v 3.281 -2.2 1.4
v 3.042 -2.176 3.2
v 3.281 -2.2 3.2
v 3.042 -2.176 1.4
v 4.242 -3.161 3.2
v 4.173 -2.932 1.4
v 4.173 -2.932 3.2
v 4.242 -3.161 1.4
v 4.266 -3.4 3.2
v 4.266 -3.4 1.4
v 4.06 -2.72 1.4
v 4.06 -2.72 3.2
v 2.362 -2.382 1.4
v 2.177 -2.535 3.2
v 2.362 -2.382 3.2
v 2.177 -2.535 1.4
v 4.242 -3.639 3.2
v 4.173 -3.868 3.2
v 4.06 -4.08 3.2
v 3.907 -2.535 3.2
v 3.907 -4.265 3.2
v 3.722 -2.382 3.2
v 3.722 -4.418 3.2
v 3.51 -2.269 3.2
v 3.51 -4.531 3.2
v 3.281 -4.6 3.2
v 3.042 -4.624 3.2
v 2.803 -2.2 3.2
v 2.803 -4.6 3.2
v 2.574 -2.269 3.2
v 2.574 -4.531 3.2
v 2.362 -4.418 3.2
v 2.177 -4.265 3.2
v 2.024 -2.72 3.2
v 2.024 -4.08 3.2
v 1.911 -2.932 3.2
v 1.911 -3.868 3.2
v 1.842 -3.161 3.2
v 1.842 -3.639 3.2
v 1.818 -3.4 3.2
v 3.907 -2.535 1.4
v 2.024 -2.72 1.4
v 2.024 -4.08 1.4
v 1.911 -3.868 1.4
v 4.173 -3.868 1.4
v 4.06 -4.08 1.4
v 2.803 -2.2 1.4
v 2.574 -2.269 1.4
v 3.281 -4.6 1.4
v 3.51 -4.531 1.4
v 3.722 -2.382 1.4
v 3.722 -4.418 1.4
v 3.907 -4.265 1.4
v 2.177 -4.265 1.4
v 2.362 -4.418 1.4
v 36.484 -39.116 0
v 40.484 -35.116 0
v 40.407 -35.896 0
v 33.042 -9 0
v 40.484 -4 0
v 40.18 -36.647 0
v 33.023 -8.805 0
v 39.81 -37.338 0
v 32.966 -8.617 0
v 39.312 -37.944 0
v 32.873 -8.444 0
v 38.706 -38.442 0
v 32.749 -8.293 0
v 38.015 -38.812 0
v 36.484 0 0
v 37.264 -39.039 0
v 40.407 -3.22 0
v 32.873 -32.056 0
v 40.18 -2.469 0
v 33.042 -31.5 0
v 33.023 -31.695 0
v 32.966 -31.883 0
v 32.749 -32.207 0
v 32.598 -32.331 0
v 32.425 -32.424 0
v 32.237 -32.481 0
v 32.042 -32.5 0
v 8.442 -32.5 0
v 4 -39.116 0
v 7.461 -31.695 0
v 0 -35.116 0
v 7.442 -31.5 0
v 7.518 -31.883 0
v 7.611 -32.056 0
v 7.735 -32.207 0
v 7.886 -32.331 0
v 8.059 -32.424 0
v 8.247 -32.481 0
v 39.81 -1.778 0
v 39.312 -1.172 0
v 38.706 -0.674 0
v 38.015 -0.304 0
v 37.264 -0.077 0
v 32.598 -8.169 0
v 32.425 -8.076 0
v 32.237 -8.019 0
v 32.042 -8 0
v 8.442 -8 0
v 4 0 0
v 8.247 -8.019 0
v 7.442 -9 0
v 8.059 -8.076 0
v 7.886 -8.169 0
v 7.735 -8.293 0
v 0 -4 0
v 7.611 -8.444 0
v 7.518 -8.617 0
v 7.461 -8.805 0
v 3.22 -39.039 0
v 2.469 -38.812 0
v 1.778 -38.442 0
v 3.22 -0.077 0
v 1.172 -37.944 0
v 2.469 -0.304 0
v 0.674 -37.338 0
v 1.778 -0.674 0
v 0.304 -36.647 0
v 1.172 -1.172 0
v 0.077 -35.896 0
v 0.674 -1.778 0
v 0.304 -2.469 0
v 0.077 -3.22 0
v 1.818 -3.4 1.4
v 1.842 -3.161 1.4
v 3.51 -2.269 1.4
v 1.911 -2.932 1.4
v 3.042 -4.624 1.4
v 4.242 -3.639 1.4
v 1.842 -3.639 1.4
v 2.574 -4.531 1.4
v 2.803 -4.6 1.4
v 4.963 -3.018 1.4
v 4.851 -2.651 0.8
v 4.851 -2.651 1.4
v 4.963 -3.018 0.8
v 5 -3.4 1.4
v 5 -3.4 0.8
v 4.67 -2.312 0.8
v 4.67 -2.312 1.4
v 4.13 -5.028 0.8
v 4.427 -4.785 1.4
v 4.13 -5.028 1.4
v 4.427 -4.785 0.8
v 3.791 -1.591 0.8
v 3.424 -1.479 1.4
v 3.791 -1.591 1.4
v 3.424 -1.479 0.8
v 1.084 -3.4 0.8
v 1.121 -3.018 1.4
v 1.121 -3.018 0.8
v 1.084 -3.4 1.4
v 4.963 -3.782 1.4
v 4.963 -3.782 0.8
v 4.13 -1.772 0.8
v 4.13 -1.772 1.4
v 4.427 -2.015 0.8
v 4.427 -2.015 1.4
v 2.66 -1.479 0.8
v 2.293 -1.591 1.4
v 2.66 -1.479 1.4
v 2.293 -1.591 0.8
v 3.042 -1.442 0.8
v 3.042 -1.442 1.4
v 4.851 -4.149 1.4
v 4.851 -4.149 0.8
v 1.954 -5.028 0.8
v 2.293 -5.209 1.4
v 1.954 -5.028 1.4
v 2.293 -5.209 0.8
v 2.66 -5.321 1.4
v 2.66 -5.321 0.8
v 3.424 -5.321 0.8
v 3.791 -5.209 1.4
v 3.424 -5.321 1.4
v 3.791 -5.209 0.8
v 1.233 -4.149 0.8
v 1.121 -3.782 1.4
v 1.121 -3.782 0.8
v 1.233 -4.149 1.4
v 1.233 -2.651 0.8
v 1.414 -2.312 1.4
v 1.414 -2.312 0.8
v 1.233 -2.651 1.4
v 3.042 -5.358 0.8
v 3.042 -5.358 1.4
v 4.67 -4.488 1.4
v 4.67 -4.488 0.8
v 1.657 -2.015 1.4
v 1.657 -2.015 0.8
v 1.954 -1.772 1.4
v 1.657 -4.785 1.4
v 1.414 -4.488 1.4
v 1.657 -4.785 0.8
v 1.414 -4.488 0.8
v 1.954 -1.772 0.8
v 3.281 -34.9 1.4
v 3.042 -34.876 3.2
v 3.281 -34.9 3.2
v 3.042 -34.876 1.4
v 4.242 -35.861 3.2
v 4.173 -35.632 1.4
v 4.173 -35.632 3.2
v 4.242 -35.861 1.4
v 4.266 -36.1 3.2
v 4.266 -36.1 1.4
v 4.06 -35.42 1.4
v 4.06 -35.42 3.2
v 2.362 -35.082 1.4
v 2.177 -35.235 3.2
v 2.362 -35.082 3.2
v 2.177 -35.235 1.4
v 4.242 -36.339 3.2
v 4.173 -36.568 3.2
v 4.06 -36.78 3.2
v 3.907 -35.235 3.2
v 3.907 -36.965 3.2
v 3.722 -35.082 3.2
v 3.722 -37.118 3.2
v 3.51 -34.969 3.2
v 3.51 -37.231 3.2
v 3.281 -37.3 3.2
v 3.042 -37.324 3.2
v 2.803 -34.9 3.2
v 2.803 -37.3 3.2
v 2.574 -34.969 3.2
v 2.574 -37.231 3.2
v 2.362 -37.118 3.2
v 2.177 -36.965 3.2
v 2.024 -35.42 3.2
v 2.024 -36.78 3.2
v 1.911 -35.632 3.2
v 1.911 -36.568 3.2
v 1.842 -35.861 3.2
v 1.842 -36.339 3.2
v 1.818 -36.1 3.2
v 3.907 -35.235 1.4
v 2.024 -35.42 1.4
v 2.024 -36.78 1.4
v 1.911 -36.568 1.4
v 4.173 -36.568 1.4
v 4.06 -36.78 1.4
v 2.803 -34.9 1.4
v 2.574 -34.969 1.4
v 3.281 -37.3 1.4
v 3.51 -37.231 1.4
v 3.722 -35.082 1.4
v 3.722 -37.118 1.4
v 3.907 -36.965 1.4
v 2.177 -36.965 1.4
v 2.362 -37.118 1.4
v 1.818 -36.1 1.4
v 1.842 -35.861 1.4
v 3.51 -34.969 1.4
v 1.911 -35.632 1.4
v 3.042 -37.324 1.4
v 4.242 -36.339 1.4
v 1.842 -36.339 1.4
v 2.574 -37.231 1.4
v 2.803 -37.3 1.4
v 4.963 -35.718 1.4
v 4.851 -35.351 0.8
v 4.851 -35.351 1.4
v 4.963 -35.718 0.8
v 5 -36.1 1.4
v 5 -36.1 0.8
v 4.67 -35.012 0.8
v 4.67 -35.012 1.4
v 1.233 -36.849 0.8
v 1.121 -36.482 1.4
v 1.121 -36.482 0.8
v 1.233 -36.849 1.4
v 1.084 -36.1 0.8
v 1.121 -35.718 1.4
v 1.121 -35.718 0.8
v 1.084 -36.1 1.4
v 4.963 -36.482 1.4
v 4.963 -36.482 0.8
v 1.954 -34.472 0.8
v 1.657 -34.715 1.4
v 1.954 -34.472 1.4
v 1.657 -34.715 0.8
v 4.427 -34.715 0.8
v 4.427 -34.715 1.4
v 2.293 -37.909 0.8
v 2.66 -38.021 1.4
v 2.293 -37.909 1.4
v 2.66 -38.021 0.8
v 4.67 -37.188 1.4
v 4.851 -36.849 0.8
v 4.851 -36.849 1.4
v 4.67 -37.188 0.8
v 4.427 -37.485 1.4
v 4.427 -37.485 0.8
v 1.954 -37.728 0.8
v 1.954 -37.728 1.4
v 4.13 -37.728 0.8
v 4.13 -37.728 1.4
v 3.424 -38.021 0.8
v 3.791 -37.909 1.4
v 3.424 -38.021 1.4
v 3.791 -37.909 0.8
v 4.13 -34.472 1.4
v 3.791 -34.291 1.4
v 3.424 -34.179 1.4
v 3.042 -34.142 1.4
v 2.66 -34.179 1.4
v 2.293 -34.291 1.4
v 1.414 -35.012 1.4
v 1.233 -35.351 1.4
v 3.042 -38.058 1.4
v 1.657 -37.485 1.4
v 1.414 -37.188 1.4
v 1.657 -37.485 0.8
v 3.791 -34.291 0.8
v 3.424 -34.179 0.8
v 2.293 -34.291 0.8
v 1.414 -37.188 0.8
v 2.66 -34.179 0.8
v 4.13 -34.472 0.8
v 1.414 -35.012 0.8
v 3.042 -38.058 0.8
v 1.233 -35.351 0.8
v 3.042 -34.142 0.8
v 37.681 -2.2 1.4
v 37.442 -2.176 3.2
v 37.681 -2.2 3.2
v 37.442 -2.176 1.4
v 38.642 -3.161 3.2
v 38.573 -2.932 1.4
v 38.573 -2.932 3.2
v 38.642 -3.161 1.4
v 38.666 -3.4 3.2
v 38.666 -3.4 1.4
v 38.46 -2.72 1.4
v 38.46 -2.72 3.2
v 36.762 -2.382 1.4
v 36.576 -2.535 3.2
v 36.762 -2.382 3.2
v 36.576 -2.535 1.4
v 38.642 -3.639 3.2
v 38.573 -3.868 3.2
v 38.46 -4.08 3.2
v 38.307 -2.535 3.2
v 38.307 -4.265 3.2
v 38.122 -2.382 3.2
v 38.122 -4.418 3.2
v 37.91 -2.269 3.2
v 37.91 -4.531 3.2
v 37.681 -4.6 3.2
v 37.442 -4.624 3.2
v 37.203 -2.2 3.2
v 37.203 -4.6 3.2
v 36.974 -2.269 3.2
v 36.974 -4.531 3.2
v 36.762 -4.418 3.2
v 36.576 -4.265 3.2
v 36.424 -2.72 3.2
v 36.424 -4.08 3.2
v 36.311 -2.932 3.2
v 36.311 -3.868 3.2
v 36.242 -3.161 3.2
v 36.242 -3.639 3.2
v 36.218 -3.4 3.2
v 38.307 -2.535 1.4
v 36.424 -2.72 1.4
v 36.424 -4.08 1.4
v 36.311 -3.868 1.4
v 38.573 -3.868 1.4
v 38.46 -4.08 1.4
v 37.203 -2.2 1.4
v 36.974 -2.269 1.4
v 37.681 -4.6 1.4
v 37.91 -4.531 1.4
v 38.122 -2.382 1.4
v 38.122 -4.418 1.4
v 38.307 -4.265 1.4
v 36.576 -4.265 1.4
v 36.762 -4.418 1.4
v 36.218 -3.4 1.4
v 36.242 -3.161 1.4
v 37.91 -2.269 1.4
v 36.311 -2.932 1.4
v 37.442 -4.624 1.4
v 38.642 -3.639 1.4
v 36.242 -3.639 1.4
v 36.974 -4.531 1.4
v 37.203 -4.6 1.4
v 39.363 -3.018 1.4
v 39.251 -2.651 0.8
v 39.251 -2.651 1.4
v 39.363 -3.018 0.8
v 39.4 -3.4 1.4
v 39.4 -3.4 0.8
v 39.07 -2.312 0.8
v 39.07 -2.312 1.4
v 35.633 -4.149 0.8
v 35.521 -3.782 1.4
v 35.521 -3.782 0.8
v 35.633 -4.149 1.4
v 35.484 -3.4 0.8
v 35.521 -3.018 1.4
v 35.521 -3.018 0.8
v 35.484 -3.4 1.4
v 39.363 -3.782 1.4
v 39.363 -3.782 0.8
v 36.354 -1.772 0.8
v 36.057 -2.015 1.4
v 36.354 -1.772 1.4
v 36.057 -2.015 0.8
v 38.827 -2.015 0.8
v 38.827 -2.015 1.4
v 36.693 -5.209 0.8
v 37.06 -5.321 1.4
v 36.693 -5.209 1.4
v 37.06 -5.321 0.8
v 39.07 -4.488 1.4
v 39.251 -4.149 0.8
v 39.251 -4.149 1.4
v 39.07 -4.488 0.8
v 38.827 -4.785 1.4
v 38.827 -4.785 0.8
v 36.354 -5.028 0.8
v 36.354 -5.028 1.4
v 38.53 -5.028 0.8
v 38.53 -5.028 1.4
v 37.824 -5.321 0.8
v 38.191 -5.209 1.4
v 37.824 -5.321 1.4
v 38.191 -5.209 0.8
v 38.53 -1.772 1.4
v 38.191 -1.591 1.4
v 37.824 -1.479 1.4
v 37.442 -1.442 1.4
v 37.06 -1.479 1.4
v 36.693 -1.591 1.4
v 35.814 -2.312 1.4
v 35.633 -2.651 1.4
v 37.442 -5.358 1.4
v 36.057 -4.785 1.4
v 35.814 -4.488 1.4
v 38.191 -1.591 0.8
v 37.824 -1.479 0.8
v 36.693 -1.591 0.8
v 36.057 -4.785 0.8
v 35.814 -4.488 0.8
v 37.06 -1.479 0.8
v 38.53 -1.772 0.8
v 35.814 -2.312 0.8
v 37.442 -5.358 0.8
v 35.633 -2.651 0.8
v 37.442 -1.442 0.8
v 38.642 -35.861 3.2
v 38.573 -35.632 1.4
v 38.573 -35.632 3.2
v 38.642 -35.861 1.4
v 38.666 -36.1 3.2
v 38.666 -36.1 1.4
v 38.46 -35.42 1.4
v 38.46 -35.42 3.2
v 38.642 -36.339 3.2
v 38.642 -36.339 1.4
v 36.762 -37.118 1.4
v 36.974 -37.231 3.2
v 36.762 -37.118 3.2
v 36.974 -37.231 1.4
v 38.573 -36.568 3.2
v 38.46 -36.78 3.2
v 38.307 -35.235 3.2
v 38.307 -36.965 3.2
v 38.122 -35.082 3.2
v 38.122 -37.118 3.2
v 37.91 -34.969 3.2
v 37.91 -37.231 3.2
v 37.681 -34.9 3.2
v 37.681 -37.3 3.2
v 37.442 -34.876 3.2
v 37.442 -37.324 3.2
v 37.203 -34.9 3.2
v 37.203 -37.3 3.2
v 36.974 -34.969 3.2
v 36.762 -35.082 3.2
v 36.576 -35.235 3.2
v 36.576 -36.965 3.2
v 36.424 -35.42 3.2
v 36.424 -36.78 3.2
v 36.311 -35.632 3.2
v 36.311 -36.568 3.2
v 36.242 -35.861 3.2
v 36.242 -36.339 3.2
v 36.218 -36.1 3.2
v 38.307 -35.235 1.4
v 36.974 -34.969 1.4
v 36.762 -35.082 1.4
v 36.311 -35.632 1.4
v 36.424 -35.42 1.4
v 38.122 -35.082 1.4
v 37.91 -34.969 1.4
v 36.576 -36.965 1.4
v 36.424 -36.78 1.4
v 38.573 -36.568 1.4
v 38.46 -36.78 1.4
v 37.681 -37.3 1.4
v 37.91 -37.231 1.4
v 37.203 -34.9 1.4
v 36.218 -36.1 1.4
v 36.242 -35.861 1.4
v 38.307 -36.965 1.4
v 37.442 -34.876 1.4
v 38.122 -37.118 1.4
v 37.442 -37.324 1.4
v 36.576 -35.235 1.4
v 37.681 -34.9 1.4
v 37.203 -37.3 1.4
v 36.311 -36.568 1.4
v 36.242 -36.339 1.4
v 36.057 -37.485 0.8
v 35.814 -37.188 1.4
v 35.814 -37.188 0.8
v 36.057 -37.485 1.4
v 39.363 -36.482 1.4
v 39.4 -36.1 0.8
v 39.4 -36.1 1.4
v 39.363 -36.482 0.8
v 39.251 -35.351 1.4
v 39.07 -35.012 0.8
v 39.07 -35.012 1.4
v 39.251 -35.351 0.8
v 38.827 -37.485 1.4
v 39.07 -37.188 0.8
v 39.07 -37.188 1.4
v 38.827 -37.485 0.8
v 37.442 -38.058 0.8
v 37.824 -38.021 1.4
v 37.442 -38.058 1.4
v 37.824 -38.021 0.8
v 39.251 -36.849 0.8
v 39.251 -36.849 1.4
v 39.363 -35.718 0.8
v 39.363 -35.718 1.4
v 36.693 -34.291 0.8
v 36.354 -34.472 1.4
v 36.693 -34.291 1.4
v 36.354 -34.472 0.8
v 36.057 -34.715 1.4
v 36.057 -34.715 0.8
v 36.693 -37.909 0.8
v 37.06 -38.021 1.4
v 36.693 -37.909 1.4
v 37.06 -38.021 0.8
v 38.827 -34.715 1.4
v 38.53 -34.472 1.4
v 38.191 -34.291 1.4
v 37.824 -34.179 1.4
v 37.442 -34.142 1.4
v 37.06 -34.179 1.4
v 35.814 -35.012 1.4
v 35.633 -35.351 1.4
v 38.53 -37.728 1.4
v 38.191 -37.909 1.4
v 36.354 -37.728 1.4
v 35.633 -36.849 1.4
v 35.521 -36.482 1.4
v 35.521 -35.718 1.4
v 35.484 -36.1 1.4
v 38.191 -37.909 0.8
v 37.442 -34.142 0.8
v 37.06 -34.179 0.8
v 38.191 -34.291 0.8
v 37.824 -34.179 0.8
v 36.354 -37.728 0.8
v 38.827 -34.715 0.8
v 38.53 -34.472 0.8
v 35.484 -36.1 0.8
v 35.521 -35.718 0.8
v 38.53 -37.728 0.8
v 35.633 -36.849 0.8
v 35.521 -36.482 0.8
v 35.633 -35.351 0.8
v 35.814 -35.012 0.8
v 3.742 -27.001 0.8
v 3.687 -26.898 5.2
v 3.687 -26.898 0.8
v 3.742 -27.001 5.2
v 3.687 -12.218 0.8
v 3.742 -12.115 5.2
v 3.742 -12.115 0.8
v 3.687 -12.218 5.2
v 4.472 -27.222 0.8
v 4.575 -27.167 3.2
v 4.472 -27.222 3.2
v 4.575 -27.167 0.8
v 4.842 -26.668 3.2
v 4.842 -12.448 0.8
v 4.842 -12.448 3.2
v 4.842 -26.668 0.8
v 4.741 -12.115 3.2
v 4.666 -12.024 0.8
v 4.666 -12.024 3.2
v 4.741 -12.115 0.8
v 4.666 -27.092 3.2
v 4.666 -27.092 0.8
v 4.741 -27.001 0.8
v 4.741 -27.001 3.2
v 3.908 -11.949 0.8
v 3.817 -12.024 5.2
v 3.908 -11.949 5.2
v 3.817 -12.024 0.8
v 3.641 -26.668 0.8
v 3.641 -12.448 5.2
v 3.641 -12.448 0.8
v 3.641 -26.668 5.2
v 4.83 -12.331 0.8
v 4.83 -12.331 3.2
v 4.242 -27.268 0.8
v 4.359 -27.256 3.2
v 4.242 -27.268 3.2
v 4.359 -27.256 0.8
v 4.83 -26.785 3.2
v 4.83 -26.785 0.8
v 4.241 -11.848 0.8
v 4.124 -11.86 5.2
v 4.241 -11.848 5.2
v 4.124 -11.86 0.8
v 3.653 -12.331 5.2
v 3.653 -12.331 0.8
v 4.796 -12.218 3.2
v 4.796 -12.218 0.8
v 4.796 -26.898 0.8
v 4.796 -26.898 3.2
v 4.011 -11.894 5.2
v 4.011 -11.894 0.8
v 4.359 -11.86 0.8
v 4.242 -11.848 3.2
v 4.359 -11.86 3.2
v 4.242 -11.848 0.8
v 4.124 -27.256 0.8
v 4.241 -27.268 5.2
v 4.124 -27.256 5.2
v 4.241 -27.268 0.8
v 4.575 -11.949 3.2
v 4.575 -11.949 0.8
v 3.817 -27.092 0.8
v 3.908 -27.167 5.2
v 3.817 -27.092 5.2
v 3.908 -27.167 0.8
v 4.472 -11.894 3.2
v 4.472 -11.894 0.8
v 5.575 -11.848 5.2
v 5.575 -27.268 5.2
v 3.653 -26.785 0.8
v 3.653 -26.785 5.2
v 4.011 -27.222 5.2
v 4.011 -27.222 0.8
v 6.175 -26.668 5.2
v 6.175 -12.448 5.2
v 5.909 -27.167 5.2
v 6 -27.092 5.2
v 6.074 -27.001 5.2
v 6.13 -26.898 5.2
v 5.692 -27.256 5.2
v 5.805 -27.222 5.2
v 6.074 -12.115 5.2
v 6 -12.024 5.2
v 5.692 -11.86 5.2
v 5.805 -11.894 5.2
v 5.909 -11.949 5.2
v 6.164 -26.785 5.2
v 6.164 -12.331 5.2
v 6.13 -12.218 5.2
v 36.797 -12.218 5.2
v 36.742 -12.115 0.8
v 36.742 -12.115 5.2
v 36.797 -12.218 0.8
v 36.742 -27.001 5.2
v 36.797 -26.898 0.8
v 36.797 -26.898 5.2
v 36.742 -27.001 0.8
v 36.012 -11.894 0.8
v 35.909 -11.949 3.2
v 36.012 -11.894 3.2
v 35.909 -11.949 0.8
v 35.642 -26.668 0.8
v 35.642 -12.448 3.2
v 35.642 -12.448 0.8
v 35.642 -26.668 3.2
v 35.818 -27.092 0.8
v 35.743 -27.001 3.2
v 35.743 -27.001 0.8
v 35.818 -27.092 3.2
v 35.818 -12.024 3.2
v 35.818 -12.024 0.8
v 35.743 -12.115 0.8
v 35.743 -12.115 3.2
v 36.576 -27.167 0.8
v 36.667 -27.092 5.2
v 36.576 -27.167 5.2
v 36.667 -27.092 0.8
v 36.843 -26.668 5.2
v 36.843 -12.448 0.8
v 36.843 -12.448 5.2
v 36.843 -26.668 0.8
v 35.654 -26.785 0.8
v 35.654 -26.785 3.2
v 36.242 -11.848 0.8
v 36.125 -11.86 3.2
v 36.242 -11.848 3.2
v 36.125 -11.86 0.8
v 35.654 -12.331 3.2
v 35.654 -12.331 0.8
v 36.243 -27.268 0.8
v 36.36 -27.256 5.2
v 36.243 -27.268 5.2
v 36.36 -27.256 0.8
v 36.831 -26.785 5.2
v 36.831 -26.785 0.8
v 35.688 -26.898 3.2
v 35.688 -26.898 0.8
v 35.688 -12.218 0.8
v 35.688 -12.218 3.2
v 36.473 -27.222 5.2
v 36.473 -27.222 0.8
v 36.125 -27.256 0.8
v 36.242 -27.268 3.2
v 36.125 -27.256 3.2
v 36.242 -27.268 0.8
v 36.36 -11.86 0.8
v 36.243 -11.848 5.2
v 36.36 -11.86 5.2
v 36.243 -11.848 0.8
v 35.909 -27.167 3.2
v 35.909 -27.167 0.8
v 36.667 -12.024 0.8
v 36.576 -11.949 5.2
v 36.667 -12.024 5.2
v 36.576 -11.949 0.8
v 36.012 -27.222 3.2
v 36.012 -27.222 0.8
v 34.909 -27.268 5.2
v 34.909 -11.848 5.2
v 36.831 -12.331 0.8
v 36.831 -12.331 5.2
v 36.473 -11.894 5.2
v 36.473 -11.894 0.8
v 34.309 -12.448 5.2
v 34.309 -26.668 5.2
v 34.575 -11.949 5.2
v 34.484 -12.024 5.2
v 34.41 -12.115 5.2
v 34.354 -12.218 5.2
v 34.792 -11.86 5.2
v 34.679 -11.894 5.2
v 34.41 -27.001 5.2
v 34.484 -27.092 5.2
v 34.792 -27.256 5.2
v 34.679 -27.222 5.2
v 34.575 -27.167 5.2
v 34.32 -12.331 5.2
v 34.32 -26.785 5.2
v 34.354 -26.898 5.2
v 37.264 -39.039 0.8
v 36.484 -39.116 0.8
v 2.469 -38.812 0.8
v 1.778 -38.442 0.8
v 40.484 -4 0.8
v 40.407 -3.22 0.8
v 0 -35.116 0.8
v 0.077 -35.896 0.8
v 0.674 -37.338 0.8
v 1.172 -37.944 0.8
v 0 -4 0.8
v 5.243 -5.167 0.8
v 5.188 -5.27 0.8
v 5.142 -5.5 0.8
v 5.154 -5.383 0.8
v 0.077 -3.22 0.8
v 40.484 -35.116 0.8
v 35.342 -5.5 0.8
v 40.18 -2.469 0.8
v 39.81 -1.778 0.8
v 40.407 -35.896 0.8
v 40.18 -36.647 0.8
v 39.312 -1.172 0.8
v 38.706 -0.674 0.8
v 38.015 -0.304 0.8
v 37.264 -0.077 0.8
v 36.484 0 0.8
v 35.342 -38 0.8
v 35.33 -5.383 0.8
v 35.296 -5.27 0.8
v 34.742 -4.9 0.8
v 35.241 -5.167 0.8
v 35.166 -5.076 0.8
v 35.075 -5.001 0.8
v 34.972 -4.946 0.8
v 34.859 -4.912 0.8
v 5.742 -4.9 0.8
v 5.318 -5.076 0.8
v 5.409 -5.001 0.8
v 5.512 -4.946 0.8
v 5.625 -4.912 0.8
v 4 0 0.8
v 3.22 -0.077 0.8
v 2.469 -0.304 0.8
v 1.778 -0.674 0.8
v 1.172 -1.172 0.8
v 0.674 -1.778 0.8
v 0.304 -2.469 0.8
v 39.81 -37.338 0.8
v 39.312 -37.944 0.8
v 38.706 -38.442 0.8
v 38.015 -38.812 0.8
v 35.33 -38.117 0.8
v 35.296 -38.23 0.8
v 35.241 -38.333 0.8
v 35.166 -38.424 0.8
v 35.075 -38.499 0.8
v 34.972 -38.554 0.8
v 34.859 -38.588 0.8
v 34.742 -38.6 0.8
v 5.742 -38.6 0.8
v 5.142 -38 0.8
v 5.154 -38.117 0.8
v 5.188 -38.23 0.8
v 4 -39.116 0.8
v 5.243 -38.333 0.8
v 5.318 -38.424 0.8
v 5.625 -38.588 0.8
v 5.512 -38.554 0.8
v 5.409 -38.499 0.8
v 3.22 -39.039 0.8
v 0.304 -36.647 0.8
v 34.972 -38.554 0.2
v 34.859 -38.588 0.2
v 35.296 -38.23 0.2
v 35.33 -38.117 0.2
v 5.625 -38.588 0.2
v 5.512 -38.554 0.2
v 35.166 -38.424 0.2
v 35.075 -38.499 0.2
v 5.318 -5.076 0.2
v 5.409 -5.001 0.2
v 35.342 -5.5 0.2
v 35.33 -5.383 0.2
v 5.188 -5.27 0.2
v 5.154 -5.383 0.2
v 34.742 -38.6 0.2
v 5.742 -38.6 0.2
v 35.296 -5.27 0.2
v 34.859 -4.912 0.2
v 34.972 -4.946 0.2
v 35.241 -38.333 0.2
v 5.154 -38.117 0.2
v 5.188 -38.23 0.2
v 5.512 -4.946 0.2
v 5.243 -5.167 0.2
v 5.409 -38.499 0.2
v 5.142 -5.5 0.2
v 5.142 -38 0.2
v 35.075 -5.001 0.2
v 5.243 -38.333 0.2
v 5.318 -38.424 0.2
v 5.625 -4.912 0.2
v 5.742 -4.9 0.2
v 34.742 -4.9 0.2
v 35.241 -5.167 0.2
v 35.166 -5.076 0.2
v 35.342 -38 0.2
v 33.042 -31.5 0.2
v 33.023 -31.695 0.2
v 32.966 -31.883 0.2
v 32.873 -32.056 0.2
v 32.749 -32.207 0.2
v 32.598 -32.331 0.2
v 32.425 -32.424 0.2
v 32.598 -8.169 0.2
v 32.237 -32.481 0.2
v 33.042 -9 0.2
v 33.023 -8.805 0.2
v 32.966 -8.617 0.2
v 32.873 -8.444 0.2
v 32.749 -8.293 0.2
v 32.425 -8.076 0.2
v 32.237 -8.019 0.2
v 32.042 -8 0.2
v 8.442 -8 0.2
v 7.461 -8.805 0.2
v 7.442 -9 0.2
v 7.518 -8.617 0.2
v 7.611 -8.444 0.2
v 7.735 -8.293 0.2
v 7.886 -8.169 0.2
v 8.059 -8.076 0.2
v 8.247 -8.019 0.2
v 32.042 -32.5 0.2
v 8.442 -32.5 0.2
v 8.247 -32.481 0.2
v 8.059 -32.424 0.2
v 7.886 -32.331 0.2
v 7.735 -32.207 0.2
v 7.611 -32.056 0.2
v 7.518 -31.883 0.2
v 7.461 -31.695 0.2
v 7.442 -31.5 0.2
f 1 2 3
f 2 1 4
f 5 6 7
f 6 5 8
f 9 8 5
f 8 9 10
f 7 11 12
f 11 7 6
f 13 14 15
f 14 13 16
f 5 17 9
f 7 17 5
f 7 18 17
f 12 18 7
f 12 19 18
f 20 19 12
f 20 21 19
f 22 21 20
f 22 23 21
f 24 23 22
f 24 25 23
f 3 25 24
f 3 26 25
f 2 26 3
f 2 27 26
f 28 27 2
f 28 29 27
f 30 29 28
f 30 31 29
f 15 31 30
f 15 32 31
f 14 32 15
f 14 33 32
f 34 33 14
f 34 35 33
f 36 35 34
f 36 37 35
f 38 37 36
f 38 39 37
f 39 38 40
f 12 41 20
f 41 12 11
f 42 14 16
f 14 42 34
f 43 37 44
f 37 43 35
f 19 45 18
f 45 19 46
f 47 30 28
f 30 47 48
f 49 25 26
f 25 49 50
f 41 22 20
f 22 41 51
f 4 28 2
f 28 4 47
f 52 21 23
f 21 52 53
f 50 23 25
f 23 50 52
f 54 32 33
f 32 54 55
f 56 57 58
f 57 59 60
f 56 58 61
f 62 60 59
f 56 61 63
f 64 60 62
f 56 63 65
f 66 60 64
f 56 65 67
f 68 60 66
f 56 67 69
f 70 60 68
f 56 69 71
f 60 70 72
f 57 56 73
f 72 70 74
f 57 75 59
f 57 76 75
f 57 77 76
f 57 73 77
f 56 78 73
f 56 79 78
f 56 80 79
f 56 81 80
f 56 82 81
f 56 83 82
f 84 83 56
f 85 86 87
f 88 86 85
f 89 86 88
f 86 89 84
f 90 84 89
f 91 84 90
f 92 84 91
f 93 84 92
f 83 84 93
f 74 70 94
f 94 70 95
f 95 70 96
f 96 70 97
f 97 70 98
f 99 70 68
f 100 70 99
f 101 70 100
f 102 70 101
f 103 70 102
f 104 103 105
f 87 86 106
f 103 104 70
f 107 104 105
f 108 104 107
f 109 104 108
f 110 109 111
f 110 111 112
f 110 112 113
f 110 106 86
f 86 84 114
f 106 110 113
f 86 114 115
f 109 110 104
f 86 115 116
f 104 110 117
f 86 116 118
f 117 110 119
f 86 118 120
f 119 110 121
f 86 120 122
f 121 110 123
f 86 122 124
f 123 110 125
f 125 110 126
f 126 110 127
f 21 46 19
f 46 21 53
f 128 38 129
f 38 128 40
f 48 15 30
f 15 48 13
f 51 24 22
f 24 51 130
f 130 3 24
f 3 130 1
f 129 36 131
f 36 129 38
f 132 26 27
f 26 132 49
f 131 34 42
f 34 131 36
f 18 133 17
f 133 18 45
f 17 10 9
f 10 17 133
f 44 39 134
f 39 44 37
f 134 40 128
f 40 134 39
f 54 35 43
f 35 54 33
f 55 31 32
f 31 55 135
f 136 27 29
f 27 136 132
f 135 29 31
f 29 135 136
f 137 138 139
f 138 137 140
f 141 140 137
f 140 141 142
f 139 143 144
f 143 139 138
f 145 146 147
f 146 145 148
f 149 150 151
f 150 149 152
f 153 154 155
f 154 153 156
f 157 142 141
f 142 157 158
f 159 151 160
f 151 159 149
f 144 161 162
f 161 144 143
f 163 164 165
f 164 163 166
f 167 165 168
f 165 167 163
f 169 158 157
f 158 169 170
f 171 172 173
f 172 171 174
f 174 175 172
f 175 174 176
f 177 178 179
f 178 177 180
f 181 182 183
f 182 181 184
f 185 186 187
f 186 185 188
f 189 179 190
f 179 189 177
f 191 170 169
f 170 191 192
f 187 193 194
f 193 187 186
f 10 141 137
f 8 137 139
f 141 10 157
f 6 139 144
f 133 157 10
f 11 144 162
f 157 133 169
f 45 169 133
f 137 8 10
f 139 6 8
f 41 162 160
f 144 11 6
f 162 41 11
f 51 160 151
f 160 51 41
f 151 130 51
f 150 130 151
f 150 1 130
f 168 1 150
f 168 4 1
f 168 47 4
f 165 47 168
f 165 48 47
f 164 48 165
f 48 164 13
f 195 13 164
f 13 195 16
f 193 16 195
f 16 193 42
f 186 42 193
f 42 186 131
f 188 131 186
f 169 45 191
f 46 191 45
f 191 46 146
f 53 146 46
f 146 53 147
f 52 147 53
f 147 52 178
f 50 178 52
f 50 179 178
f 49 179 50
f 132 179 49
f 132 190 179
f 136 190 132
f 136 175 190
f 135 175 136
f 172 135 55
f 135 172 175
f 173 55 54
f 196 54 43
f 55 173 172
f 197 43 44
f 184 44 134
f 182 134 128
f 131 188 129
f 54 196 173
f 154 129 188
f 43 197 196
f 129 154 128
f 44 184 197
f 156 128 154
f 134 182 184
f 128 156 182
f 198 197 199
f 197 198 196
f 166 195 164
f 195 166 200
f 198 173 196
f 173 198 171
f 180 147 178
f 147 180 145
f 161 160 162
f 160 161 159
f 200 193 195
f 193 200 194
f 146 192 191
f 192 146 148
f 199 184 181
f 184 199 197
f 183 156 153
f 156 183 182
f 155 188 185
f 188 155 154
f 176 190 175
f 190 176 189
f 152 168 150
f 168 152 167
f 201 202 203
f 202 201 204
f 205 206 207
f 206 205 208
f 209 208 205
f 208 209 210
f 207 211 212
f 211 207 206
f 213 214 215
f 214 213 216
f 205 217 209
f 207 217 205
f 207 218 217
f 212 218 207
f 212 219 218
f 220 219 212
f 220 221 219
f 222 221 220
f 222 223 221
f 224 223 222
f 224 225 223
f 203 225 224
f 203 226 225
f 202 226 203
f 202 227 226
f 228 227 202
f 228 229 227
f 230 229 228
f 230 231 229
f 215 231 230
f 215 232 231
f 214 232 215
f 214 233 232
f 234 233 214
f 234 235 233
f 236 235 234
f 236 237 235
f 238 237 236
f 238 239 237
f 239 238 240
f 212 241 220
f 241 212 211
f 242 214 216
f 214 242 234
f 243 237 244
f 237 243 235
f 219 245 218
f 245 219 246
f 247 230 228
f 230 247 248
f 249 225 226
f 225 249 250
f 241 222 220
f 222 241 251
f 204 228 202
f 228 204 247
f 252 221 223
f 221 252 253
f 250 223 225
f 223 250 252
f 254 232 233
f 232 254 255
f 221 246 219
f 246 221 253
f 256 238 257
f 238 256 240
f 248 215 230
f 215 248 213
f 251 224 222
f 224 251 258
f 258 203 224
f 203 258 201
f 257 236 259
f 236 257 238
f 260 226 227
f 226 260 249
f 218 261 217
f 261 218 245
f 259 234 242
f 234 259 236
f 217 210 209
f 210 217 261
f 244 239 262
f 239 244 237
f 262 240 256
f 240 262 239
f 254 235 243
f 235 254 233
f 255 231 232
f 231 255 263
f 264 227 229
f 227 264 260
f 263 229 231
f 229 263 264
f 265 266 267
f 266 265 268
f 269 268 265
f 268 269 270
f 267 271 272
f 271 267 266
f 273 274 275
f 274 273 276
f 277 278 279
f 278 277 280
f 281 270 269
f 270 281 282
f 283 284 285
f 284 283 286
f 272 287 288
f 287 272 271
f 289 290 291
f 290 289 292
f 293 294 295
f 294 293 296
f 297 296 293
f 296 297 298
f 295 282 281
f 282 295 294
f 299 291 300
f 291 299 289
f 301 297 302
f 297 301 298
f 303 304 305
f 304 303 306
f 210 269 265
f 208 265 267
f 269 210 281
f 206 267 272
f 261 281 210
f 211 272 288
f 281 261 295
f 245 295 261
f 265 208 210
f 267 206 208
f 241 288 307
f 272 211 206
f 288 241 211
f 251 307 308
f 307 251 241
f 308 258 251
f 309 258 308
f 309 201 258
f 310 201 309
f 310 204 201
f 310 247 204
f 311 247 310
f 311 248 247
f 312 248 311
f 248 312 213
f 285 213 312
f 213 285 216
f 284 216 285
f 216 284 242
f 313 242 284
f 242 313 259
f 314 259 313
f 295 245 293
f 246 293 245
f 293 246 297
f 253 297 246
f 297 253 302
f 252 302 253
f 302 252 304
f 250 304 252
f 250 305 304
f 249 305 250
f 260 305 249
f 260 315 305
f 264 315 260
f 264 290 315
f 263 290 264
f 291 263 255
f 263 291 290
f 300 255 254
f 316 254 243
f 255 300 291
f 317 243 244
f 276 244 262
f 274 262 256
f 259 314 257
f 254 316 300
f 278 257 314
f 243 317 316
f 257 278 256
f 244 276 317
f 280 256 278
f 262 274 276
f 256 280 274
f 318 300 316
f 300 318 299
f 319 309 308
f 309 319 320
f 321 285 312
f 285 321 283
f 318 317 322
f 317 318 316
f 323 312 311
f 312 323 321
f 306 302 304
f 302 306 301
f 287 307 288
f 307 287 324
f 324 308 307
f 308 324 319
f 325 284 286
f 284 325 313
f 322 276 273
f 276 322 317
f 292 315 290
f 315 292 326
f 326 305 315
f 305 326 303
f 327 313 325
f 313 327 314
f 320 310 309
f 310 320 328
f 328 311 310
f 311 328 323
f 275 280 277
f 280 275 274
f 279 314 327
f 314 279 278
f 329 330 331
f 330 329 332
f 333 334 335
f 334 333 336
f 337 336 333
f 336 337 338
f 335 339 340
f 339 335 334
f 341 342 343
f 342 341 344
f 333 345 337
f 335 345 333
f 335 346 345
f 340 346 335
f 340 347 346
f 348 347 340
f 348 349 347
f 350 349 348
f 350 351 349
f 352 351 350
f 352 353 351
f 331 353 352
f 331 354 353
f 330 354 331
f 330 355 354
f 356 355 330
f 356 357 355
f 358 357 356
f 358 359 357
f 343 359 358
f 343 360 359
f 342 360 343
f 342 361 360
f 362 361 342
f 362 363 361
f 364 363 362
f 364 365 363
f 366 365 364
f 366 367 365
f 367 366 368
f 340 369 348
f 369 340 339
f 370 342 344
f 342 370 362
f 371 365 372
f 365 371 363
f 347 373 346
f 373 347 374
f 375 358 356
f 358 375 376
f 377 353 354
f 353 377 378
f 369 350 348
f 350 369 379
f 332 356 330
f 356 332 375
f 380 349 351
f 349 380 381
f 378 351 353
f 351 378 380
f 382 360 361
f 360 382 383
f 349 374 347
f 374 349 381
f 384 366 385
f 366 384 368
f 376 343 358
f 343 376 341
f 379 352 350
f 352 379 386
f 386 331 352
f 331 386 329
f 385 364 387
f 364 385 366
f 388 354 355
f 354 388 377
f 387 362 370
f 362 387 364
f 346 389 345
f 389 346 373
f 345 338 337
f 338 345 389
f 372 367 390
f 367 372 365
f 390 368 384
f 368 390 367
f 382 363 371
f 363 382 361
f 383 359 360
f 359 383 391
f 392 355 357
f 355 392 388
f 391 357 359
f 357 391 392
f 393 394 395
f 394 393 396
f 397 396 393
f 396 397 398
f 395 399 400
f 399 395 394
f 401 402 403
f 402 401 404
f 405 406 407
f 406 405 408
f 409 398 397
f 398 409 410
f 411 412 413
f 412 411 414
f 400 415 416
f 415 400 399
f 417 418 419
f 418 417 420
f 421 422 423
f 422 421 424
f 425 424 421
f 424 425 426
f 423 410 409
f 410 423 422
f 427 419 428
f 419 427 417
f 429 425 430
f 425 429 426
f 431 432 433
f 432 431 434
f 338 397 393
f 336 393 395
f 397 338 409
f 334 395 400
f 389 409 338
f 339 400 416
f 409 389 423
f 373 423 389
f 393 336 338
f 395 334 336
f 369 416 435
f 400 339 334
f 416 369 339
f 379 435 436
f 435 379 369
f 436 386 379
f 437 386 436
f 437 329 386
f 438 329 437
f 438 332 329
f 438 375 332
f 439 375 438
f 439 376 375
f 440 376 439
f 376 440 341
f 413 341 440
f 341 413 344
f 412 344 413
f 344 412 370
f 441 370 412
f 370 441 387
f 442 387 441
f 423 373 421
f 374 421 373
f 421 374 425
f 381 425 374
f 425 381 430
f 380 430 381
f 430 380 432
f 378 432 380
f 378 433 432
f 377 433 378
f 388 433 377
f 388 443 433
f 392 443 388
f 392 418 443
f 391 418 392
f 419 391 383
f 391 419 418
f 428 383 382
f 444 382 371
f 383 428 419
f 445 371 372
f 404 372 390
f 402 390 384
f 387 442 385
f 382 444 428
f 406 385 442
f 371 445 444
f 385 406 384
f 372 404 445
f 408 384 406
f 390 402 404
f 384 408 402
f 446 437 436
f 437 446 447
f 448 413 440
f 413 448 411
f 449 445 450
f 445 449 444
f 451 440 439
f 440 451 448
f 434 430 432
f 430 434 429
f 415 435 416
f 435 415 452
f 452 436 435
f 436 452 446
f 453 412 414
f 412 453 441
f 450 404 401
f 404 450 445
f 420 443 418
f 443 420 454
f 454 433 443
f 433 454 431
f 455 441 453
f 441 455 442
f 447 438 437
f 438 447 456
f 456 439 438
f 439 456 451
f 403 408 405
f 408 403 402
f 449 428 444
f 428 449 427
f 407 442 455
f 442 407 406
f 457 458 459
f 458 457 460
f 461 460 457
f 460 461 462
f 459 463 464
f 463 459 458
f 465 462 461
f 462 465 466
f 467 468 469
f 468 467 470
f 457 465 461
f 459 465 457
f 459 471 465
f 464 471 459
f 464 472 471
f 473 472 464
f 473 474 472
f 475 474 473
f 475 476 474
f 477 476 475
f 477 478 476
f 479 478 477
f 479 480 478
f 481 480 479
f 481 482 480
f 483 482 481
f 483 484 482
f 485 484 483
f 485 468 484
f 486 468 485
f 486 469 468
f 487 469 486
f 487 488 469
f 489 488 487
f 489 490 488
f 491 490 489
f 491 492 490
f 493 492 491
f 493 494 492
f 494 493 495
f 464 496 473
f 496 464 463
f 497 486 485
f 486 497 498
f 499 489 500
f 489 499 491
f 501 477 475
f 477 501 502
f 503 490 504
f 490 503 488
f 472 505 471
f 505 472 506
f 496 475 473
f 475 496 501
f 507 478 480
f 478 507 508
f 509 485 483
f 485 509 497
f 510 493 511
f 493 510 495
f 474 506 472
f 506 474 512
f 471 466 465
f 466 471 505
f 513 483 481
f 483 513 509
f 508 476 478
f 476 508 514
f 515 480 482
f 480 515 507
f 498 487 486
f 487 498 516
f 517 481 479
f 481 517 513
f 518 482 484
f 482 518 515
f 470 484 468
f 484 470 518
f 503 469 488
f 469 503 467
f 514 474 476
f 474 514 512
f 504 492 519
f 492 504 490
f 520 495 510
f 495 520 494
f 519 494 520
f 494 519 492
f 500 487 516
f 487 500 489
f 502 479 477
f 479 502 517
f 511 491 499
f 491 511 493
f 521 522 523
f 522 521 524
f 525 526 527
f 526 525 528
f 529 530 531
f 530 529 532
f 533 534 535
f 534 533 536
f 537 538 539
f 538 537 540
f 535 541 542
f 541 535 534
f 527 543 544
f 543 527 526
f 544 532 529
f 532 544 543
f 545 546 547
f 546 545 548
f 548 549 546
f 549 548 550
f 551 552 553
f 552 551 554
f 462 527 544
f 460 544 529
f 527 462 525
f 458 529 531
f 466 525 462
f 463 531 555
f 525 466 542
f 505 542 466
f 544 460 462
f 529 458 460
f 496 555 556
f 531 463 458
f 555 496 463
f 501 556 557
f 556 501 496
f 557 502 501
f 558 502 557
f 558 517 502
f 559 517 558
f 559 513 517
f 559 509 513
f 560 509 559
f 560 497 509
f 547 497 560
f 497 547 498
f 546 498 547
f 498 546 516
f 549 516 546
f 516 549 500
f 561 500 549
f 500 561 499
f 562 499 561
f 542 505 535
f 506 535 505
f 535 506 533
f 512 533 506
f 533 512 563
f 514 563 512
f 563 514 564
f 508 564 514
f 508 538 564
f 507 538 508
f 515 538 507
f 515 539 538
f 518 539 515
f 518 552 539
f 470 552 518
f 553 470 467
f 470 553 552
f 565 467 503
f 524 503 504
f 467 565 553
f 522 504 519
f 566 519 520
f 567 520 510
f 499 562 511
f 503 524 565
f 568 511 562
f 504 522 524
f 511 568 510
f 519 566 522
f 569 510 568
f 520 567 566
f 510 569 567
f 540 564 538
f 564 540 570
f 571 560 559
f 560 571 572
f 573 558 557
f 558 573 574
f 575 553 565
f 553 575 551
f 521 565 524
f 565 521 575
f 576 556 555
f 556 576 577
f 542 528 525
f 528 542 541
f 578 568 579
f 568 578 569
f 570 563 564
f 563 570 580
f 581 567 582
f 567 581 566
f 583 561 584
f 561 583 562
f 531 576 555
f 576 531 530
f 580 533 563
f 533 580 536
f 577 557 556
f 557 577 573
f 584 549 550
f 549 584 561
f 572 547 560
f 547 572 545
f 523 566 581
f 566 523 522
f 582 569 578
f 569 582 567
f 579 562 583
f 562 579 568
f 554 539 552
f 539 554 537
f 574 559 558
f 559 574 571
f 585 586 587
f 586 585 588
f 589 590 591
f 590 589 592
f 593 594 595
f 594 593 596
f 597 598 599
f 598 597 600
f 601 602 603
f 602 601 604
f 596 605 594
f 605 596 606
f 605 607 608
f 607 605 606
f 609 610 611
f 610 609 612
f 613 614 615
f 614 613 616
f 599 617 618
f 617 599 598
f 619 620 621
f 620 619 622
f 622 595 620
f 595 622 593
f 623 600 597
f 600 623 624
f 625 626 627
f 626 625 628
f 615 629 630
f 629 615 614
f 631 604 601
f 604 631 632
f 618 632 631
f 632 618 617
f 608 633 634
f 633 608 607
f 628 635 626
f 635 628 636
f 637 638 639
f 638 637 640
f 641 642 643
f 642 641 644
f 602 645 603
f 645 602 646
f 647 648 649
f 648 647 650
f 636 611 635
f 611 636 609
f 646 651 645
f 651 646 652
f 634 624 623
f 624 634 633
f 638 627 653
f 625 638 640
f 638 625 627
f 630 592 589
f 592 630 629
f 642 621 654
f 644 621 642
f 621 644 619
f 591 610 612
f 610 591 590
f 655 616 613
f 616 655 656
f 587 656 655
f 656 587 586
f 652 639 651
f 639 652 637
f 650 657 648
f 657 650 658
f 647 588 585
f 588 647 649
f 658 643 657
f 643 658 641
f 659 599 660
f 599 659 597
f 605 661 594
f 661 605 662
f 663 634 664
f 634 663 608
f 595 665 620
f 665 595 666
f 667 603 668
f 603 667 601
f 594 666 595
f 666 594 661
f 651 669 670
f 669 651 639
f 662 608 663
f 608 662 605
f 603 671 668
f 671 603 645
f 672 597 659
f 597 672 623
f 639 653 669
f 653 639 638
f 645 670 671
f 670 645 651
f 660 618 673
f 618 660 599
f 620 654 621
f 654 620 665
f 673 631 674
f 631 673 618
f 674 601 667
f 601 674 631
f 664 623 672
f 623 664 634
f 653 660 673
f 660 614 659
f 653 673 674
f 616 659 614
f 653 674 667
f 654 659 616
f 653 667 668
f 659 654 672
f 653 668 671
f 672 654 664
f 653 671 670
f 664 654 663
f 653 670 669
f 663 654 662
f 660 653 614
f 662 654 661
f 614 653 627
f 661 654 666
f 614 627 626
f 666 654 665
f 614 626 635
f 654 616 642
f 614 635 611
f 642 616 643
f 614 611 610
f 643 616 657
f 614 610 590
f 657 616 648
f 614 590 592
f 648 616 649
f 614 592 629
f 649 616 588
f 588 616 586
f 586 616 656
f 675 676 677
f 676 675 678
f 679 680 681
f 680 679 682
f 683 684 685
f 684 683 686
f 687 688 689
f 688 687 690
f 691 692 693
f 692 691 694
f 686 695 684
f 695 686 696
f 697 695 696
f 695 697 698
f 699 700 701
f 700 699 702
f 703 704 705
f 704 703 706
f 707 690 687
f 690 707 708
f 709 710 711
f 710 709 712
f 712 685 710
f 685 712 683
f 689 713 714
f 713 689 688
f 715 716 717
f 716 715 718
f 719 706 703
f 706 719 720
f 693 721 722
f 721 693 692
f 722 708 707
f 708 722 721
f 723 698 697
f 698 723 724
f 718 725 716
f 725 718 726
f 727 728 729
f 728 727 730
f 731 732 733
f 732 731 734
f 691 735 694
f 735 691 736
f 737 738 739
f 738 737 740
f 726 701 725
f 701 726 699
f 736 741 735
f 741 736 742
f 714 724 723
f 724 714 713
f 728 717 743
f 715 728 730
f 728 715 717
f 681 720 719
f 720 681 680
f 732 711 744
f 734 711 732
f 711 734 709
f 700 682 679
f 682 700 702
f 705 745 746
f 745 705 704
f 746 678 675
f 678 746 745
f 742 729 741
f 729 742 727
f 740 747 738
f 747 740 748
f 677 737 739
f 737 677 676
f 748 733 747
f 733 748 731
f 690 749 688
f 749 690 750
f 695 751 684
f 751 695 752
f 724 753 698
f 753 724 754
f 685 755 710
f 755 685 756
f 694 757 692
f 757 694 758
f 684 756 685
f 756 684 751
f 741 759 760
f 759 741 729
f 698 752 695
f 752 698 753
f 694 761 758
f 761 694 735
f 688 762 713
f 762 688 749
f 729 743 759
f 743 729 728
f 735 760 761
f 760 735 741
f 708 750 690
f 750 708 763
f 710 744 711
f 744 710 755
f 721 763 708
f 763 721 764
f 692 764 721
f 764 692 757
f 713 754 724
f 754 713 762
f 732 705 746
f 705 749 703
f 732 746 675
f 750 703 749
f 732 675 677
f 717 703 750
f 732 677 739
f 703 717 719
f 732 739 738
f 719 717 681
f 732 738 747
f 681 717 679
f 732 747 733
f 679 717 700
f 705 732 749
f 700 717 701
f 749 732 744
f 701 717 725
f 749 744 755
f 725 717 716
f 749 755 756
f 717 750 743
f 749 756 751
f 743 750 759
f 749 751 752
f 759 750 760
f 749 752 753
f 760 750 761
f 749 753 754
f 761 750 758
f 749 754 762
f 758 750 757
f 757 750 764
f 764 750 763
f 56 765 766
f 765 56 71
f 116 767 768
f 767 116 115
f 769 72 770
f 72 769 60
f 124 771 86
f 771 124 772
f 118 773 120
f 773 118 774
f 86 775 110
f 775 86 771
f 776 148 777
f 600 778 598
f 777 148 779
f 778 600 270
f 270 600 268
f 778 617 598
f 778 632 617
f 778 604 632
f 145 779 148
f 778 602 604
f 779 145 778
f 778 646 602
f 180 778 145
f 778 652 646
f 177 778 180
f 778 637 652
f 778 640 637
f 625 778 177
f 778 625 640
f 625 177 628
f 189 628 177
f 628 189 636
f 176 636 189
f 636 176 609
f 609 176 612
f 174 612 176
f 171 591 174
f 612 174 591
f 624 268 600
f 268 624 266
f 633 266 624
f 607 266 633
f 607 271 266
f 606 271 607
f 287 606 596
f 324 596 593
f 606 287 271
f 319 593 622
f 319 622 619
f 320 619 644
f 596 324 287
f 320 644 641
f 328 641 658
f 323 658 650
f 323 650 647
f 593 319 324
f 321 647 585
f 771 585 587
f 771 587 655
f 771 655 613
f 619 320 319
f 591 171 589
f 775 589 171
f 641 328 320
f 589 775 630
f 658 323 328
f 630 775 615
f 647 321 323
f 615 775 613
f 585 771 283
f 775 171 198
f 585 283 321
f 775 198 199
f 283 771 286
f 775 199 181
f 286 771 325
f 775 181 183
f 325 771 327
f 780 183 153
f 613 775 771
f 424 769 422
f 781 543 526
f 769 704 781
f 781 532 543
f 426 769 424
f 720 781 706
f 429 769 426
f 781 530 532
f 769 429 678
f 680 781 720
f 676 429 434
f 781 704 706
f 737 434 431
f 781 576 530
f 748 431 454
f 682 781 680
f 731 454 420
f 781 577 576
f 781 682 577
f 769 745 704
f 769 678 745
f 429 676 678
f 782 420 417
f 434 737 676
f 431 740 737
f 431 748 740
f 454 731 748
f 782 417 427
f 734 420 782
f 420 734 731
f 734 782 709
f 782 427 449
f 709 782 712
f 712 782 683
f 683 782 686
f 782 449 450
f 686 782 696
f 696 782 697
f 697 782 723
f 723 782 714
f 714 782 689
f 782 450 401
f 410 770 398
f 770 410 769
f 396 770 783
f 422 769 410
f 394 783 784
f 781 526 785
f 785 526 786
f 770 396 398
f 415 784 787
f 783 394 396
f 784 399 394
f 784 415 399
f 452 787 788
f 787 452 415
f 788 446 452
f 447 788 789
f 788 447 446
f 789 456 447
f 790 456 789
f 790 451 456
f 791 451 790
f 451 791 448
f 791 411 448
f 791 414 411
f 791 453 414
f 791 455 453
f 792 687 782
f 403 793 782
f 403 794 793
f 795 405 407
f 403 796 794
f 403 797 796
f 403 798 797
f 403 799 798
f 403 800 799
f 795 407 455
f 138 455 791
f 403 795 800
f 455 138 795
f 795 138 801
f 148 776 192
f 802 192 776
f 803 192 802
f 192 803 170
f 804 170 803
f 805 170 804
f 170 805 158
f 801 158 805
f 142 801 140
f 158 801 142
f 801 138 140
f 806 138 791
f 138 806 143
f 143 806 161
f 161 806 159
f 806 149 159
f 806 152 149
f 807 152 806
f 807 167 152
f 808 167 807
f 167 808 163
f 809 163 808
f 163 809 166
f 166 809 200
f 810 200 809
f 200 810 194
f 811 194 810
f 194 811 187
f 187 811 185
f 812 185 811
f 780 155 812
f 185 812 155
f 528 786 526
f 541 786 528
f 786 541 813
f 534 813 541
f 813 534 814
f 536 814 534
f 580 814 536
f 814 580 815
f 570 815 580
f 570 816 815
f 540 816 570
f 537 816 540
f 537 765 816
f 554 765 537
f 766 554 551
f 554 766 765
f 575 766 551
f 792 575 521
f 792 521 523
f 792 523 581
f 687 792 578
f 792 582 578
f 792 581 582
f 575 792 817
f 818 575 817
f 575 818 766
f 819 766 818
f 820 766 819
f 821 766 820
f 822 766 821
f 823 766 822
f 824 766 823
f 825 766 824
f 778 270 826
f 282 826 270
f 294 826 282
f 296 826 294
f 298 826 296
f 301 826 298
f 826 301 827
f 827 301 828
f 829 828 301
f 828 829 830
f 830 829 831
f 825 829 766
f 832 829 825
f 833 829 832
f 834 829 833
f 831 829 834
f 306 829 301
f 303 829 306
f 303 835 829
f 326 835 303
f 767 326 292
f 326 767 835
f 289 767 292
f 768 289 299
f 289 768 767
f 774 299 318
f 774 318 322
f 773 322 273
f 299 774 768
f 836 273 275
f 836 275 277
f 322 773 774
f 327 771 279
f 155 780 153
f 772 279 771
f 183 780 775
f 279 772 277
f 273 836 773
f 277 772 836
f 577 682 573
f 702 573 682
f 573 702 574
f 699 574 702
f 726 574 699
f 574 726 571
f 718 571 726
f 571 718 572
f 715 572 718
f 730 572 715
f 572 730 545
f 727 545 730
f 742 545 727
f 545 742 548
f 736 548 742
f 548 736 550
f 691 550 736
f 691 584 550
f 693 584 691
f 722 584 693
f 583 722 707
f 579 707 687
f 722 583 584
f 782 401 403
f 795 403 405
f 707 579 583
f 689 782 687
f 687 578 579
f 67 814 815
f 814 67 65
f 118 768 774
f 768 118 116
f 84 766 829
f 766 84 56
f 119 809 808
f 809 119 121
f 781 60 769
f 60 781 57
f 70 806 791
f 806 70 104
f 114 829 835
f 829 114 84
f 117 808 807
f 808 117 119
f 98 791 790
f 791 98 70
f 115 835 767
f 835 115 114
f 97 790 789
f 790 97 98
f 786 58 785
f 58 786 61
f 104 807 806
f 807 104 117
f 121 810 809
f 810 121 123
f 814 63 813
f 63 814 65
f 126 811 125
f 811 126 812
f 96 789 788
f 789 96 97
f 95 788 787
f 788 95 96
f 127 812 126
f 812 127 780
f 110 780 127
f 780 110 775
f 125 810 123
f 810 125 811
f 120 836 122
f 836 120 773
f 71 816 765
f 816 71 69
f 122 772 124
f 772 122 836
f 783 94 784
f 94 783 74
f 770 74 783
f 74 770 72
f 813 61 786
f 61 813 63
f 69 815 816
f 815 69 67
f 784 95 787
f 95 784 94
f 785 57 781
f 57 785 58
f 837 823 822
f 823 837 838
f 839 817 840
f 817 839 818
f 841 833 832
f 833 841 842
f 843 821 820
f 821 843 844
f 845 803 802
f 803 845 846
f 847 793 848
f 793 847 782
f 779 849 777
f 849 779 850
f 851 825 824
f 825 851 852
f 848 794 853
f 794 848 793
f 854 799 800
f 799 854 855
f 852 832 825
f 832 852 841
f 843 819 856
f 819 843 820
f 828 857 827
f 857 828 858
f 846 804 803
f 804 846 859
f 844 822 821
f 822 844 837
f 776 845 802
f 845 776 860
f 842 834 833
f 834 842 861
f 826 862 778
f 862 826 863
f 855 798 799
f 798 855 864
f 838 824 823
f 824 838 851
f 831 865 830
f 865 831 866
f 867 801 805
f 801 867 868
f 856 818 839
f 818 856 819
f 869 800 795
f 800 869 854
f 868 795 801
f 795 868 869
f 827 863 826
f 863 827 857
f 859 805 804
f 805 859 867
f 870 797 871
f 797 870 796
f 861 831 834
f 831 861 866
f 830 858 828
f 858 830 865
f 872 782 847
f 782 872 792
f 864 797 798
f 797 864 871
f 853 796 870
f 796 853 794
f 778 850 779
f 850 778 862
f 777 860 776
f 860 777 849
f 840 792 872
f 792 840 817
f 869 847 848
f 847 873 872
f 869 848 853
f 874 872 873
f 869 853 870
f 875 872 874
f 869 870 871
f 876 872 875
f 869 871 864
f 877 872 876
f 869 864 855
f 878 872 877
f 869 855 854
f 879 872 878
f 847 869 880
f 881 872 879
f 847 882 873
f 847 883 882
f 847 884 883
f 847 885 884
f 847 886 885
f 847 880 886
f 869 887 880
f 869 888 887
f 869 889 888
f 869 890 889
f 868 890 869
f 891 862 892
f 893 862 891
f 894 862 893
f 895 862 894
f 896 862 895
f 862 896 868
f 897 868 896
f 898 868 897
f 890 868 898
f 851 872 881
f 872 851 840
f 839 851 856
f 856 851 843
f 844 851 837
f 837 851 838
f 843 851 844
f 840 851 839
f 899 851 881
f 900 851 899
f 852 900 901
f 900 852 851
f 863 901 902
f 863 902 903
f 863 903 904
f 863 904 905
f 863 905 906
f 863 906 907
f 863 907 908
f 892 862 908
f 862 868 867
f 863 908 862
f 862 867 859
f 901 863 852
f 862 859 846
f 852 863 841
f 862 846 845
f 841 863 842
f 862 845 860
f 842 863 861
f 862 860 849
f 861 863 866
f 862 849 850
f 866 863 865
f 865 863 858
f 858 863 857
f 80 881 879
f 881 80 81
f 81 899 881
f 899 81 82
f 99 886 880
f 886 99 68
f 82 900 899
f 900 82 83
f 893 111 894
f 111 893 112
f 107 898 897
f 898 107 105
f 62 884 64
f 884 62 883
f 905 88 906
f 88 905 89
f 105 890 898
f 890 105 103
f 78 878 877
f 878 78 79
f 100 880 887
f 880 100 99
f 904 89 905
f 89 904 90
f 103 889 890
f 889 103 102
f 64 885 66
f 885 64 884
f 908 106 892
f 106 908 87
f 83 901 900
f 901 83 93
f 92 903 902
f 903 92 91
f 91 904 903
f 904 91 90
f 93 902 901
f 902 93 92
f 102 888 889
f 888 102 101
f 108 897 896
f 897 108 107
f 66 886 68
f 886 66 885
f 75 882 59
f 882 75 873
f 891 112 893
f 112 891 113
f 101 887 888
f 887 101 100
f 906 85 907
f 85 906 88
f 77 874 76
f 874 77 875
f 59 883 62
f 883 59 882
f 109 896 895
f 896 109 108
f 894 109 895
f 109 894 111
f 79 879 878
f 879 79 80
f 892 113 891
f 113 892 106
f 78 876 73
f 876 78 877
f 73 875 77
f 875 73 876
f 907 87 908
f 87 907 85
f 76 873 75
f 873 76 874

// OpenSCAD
SCREEN_WIDTH = 30;
SCREEN_DEPTH = 1.54 * 25.4;
SCREEN_HEIGHT = 1.7;

SCREEN_HOLE_DIAMETER = 0.12 * 25.4;
SCREEN_HOLE_MARGIN = 1.7;
SCREEN_HORIZONTAL_SUPPORT_WIDTH = 1.34 * 25.4 + SCREEN_HOLE_DIAMETER + 2 * SCREEN_HOLE_MARGIN;
SCREEN_HORIZONTAL_SUPPORT_DEPTH = SCREEN_HOLE_DIAMETER + 2 * SCREEN_HOLE_MARGIN;

SCREEN_SUPPORT_MARGIN = 0;

SCREEN_GLASS_WIDTH = SCREEN_WIDTH - 1;
SCREEN_GLASS_HEIGHT = 1.5;
SCREEN_GLASS_DEPTH = 32.5;
SCREEN_GLASS_MARGIN_TOP = 5.5;

function Screen_totalWidth() = SCREEN_HORIZONTAL_SUPPORT_WIDTH;
function Screen_xPosition() =
    (SCREEN_HORIZONTAL_SUPPORT_WIDTH - SCREEN_WIDTH) / 2 + SCREEN_SUPPORT_MARGIN;

function Screen_holderWidth() = SCREEN_HORIZONTAL_SUPPORT_WIDTH + SCREEN_SUPPORT_MARGIN;

/**
 * Screen.
 *
 * @param positiveShape
 *     if true, draw only the positive part of the screen,
 *     if false, draw only the negative part.
 */
module Screen(positiveShape = true) {
    translate([(SCREEN_HORIZONTAL_SUPPORT_WIDTH - SCREEN_WIDTH) / 2 + SCREEN_SUPPORT_MARGIN, 0, 0]) {
        // Base
        if (positiveShape) {
            translate([0, -SCREEN_DEPTH, SCREEN_GLASS_HEIGHT])
                cube([SCREEN_WIDTH, SCREEN_DEPTH, SCREEN_HEIGHT]);
        }
        
        // Horizontal supports
        if (positiveShape) {
            width = SCREEN_HORIZONTAL_SUPPORT_WIDTH;
            depth = SCREEN_HORIZONTAL_SUPPORT_DEPTH;
            cornerRadius = 3.2;
            
            for (y = [0, -SCREEN_DEPTH + depth])
                translate([(SCREEN_WIDTH - width) / 2, -depth + y, SCREEN_GLASS_HEIGHT])
                    difference() {
                        linear_extrude(height = SCREEN_HEIGHT)
                            offset(r = cornerRadius, $fn = 32)
                                offset(r = -cornerRadius, $fn = 32)
                                    square([width, depth]);
                        
                        for (x = [SCREEN_HOLE_DIAMETER, width - SCREEN_HOLE_DIAMETER])
                            translate([x, SCREEN_HOLE_DIAMETER, -0.5])
                                cylinder(d = SCREEN_HOLE_DIAMETER, h = SCREEN_HEIGHT * 2, $fn = 32);
                    }
        }
        
        // Glass
        if (positiveShape) {
            marginTop = SCREEN_GLASS_MARGIN_TOP;
            
            translate([(SCREEN_WIDTH - SCREEN_GLASS_WIDTH)/2, -SCREEN_GLASS_DEPTH - marginTop, 0])
                cube([SCREEN_GLASS_WIDTH, SCREEN_GLASS_DEPTH, SCREEN_GLASS_HEIGHT]);
        }
    }
}

/**
 * Screen holder.
 *
 * @param positiveShape
 *     if true, draw only the positive part of the screen holder,
 *     if false, draw only the negative part.
 */
module Screen_holder(coverHeight = 1, positiveShape = true) {
    EPSILON = 0.001;
    coverThicknessUnderScreen = 0.2;
    
    // Base
    if (positiveShape) {
        cornerRadius = 4;
        translate([0, -SCREEN_DEPTH - SCREEN_SUPPORT_MARGIN, 0])
            linear_extrude(height = coverHeight)
                offset(r = cornerRadius, $fn = 32)
                    offset(r = -cornerRadius, $fn = 32)
                        square([
                            SCREEN_HORIZONTAL_SUPPORT_WIDTH + 2 * SCREEN_SUPPORT_MARGIN,
                            SCREEN_DEPTH + 2 * SCREEN_SUPPORT_MARGIN
                        ]);
    }
    
    translate([(SCREEN_HORIZONTAL_SUPPORT_WIDTH - SCREEN_WIDTH) / 2 + SCREEN_SUPPORT_MARGIN, 0, 0]) {
        
        // Glass recess
        if (!positiveShape) {
            width = SCREEN_GLASS_WIDTH;
            depth = SCREEN_GLASS_DEPTH;
            cornerRadius = 0.6;
            
            translate([(SCREEN_WIDTH - width) / 2,
                       -depth - SCREEN_GLASS_MARGIN_TOP,
                       coverThicknessUnderScreen])
                linear_extrude(height = SCREEN_GLASS_HEIGHT)
                    offset(r = cornerRadius, $fn = 32)
                        square([width, depth]);
        }
        
        // Clearance
        if (!positiveShape) {
            width = 25.6;
            depth = 24.5;
            cornerRadius = 1;
            
            translate([(SCREEN_WIDTH - width) / 2, -depth - 8, -coverHeight - EPSILON])
                linear_extrude(height = coverHeight * 2)
                    offset(r = cornerRadius, $fn = 32)
                        offset(r = -cornerRadius, $fn = 32)
                            square([width, depth]);
        }
        
        // Cylinders
        if (positiveShape) {
            diameter = SCREEN_HOLE_DIAMETER - 0.6;
            height = SCREEN_GLASS_HEIGHT + SCREEN_HEIGHT;
            supportHeight = SCREEN_GLASS_HEIGHT - 0.1;
            
            for (x = [-2.2, 32.2])
                for (y = [-3.4, -36.1])
                    translate([x, y, 0]) {
                        cylinder(d = diameter, h = height, $fn = 32);
                        cylinder(d = diameter * 1.6, h = supportHeight, $fn = 32);
                    }
        }
        
        // Vertical supports
        if (positiveShape) {
            depth = SCREEN_DEPTH - 2 * SCREEN_HORIZONTAL_SUPPORT_DEPTH - 12;
            width = 2;
            wallWidth = 0.001;
            wallHeight = width + SCREEN_GLASS_HEIGHT + SCREEN_HEIGHT - 0.2 + coverThicknessUnderScreen;
            roundingRadius = 0.6;
            
            xpositions = [-roundingRadius - 0.4, roundingRadius + 0.4 + SCREEN_WIDTH];
            
            for (x = xpositions)
                translate([
                    x,
                    -depth - (SCREEN_DEPTH - depth) / 2 + (x == xpositions[0] ? 0 : depth),
                    wallHeight
                ]) {
                    rotate([0, 0, x == xpositions[0] ? 0 : -180])
                        difference() {
                            minkowski() {
                                union() {
                                    rotate([-90, 0, 0])
                                        linear_extrude(height = depth)
                                            polygon(points = [[0, 0], [width / 1.5, 0], [0, width]]);
                                    translate([0, depth, 0])
                                        rotate([90, 0, 0])
                                            linear_extrude(height = depth)
                                                polygon(points = [
                                                    [0, 0], [width / 1.5, 0], [0, width]
                                                ]);
                                    
                                    translate([-wallWidth, 0, -wallHeight])
                                        cube([wallWidth, depth, wallHeight + width]);
                                }
                                cylinder(r = roundingRadius, h = 0.1, $fn = 32);
                            }
                            
                            translate([-2, -roundingRadius - EPSILON, 0])
                                cube([5, depth + 2 * roundingRadius + 2 * EPSILON, 5]);
                        }
                }
        }
    }
}
/*
color("blue")
difference() {
    Screen(true);
    Screen(false);
}
*/
difference() {
    Screen_holder(0.8, true);
    Screen_holder(0.8, false);
}
